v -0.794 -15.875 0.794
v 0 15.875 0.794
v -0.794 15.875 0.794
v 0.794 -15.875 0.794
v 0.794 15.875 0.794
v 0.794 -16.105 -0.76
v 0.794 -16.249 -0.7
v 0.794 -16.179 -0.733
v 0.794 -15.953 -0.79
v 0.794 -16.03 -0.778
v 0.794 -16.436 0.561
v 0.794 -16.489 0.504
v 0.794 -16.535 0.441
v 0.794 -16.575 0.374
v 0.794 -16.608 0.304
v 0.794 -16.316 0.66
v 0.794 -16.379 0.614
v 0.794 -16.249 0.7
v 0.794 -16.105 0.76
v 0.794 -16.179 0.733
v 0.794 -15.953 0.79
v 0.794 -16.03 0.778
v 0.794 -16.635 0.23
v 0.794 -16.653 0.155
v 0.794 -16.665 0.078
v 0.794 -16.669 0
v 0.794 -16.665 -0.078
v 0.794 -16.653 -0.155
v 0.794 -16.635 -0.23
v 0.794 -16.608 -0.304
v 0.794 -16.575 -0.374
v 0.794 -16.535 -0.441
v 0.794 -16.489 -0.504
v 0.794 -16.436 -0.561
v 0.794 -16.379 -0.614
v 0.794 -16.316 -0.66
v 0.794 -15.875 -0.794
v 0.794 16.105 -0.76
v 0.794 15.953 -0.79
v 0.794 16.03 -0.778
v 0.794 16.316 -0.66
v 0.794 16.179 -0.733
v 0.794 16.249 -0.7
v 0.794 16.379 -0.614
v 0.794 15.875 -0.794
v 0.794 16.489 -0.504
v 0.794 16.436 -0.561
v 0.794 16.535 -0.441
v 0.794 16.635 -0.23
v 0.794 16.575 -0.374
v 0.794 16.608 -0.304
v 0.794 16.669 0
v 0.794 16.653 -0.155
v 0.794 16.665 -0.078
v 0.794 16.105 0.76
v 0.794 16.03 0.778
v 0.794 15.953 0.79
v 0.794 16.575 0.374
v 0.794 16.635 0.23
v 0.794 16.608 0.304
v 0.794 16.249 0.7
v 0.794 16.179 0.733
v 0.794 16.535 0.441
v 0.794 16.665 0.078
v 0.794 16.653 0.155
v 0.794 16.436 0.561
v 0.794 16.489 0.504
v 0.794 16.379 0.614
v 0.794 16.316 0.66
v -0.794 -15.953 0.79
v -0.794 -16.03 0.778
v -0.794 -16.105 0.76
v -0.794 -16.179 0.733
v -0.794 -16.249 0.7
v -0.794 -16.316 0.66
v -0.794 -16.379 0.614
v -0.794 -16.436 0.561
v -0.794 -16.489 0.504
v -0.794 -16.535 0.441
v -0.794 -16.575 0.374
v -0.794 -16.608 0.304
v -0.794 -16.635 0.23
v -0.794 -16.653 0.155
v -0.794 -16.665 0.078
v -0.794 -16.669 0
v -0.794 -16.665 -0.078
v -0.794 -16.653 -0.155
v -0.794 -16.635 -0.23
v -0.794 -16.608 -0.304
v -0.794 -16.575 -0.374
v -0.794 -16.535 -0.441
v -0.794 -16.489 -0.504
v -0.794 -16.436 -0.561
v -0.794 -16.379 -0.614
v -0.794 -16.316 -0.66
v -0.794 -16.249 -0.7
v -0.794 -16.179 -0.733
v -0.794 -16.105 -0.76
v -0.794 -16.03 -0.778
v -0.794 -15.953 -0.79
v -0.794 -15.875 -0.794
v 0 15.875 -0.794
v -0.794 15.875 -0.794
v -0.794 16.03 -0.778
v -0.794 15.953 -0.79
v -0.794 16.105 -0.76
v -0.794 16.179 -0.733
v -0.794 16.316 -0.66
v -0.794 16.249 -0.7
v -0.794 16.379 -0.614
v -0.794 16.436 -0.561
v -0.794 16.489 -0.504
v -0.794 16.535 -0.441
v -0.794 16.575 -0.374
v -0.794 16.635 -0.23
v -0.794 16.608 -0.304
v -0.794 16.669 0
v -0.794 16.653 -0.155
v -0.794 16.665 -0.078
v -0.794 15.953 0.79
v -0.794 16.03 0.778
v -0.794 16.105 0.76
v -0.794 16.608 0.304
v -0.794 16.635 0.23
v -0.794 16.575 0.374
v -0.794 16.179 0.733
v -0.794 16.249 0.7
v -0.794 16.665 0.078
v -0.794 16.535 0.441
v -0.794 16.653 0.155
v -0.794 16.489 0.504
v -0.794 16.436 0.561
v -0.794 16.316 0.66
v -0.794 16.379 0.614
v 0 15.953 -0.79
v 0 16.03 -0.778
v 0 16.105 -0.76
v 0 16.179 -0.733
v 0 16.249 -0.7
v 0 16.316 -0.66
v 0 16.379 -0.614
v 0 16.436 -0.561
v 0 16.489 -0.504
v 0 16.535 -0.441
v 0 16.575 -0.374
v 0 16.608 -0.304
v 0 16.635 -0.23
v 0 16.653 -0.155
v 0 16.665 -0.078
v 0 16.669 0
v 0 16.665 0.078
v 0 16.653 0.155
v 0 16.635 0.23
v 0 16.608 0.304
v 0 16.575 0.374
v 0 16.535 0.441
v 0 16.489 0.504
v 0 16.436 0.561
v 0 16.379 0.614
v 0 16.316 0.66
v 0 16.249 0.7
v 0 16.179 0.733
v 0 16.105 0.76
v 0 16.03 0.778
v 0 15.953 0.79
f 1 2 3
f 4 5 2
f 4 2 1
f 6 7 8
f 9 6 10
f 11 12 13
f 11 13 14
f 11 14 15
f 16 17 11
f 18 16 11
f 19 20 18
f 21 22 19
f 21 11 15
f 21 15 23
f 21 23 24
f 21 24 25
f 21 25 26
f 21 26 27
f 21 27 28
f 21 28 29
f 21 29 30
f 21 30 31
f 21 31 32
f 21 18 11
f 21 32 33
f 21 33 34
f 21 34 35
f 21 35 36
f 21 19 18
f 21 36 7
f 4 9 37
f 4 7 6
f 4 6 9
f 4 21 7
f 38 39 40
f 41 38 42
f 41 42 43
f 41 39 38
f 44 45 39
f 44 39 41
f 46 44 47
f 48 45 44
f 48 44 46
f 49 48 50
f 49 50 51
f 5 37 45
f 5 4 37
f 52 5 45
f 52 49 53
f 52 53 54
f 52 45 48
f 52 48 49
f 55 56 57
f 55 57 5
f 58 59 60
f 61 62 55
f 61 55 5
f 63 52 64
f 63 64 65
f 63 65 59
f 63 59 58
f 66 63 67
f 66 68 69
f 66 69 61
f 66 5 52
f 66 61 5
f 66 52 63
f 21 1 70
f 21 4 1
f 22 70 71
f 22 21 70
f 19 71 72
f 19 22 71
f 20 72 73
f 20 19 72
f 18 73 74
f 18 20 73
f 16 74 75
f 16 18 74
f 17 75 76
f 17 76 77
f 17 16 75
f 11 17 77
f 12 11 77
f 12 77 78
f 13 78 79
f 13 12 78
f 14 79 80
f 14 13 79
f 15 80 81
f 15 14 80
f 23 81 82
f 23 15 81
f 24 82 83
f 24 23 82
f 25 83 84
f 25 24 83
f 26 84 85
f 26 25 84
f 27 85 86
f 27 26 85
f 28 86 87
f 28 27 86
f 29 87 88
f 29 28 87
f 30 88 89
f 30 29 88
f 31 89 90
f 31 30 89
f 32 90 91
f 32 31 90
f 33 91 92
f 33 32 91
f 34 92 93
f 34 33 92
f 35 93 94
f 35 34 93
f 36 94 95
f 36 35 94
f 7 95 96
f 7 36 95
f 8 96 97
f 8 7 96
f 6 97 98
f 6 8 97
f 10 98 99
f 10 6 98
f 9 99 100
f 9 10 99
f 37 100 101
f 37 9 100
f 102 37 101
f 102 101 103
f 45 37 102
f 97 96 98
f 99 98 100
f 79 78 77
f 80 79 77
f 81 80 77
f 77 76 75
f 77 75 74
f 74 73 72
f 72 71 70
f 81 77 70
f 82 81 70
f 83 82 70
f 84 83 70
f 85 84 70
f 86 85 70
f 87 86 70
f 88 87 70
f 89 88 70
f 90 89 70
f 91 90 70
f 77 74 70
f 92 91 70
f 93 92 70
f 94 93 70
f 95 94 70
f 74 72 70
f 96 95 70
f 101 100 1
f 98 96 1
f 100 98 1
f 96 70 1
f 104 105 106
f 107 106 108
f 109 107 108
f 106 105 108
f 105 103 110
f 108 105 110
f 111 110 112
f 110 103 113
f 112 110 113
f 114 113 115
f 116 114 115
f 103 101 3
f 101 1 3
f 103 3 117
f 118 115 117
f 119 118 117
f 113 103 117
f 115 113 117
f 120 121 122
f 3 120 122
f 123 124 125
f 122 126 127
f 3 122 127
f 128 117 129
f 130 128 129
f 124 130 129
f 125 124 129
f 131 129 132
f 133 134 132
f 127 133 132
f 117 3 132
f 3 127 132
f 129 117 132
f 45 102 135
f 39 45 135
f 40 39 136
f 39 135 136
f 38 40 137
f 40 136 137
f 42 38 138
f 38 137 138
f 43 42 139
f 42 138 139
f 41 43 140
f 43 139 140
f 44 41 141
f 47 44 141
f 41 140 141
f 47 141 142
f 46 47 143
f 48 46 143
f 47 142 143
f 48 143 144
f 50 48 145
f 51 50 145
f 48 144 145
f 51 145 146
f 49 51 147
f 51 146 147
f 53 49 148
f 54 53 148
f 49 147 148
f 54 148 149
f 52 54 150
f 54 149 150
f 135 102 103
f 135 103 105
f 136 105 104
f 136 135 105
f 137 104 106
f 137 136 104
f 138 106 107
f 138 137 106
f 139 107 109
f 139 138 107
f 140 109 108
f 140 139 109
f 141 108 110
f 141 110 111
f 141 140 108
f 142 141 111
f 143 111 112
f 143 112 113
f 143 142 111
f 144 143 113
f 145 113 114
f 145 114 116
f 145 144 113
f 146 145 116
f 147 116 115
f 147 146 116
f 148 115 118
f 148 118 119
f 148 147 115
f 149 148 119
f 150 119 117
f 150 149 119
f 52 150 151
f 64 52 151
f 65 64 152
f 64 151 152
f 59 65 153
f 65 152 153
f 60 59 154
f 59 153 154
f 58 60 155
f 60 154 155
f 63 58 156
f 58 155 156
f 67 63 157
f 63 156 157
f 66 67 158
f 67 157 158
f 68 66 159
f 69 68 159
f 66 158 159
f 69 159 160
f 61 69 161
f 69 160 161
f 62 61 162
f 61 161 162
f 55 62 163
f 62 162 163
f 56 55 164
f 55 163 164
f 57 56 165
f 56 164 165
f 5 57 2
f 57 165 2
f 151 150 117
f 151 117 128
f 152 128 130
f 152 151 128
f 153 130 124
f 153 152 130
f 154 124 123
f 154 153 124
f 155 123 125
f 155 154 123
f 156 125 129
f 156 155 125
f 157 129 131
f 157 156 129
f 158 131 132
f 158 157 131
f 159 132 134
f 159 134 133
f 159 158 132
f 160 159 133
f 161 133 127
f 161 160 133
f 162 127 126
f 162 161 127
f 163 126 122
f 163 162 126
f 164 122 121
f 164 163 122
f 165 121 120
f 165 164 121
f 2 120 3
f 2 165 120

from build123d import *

# Parameters (mm, degrees)
F1_DEPTH = 0.79375


with BuildPart() as f1:
    # F0 (on Right) → F1 (new body, symmetric)
    with BuildSketch(Plane.YZ):
        with BuildLine():
            ThreePointArc((-15.875, 0.79375), (-16.66875, 0), (-15.875, -0.79375))
            Line((-15.875, -0.79375), (-15.875, 0.79375))
        make_face()
        with BuildLine():
            Line((-15.875, 0.79375), (-15.875, -0.79375))
            ThreePointArc((-15.875, -0.79375), (-15.3137339924, -0.5612660076), (-15.08125, 0))
            ThreePointArc((-15.08125, 0), (-15.3137339924, 0.5612660076), (-15.875, 0.79375))
        make_face()
        with BuildLine():
            Line((-15.875, -0.79375), (15.875, -0.79375))
            ThreePointArc((15.875, -0.79375), (15.08125, 0), (15.875, 0.79375))
            Line((15.875, 0.79375), (-15.875, 0.79375))
            ThreePointArc((-15.875, 0.79375), (-15.3137339924, 0.5612660076), (-15.08125, 0))
            ThreePointArc((-15.08125, 0), (-15.3137339924, -0.5612660076), (-15.875, -0.79375))
        make_face()
        with BuildLine():
            ThreePointArc((15.875, 0.79375), (15.08125, 0), (15.875, -0.79375))
            Line((15.875, -0.79375), (15.875, 0.79375))
        make_face()
        with BuildLine():
            Line((15.875, 0.79375), (15.875, -0.79375))
            ThreePointArc((15.875, -0.79375), (16.4362660076, -0.5612660076), (16.66875, 0))
            ThreePointArc((16.66875, 0), (16.4362660076, 0.5612660076), (15.875, 0.79375))
        make_face()
    extrude(amount=F1_DEPTH, both=True)


solid = f1.part
